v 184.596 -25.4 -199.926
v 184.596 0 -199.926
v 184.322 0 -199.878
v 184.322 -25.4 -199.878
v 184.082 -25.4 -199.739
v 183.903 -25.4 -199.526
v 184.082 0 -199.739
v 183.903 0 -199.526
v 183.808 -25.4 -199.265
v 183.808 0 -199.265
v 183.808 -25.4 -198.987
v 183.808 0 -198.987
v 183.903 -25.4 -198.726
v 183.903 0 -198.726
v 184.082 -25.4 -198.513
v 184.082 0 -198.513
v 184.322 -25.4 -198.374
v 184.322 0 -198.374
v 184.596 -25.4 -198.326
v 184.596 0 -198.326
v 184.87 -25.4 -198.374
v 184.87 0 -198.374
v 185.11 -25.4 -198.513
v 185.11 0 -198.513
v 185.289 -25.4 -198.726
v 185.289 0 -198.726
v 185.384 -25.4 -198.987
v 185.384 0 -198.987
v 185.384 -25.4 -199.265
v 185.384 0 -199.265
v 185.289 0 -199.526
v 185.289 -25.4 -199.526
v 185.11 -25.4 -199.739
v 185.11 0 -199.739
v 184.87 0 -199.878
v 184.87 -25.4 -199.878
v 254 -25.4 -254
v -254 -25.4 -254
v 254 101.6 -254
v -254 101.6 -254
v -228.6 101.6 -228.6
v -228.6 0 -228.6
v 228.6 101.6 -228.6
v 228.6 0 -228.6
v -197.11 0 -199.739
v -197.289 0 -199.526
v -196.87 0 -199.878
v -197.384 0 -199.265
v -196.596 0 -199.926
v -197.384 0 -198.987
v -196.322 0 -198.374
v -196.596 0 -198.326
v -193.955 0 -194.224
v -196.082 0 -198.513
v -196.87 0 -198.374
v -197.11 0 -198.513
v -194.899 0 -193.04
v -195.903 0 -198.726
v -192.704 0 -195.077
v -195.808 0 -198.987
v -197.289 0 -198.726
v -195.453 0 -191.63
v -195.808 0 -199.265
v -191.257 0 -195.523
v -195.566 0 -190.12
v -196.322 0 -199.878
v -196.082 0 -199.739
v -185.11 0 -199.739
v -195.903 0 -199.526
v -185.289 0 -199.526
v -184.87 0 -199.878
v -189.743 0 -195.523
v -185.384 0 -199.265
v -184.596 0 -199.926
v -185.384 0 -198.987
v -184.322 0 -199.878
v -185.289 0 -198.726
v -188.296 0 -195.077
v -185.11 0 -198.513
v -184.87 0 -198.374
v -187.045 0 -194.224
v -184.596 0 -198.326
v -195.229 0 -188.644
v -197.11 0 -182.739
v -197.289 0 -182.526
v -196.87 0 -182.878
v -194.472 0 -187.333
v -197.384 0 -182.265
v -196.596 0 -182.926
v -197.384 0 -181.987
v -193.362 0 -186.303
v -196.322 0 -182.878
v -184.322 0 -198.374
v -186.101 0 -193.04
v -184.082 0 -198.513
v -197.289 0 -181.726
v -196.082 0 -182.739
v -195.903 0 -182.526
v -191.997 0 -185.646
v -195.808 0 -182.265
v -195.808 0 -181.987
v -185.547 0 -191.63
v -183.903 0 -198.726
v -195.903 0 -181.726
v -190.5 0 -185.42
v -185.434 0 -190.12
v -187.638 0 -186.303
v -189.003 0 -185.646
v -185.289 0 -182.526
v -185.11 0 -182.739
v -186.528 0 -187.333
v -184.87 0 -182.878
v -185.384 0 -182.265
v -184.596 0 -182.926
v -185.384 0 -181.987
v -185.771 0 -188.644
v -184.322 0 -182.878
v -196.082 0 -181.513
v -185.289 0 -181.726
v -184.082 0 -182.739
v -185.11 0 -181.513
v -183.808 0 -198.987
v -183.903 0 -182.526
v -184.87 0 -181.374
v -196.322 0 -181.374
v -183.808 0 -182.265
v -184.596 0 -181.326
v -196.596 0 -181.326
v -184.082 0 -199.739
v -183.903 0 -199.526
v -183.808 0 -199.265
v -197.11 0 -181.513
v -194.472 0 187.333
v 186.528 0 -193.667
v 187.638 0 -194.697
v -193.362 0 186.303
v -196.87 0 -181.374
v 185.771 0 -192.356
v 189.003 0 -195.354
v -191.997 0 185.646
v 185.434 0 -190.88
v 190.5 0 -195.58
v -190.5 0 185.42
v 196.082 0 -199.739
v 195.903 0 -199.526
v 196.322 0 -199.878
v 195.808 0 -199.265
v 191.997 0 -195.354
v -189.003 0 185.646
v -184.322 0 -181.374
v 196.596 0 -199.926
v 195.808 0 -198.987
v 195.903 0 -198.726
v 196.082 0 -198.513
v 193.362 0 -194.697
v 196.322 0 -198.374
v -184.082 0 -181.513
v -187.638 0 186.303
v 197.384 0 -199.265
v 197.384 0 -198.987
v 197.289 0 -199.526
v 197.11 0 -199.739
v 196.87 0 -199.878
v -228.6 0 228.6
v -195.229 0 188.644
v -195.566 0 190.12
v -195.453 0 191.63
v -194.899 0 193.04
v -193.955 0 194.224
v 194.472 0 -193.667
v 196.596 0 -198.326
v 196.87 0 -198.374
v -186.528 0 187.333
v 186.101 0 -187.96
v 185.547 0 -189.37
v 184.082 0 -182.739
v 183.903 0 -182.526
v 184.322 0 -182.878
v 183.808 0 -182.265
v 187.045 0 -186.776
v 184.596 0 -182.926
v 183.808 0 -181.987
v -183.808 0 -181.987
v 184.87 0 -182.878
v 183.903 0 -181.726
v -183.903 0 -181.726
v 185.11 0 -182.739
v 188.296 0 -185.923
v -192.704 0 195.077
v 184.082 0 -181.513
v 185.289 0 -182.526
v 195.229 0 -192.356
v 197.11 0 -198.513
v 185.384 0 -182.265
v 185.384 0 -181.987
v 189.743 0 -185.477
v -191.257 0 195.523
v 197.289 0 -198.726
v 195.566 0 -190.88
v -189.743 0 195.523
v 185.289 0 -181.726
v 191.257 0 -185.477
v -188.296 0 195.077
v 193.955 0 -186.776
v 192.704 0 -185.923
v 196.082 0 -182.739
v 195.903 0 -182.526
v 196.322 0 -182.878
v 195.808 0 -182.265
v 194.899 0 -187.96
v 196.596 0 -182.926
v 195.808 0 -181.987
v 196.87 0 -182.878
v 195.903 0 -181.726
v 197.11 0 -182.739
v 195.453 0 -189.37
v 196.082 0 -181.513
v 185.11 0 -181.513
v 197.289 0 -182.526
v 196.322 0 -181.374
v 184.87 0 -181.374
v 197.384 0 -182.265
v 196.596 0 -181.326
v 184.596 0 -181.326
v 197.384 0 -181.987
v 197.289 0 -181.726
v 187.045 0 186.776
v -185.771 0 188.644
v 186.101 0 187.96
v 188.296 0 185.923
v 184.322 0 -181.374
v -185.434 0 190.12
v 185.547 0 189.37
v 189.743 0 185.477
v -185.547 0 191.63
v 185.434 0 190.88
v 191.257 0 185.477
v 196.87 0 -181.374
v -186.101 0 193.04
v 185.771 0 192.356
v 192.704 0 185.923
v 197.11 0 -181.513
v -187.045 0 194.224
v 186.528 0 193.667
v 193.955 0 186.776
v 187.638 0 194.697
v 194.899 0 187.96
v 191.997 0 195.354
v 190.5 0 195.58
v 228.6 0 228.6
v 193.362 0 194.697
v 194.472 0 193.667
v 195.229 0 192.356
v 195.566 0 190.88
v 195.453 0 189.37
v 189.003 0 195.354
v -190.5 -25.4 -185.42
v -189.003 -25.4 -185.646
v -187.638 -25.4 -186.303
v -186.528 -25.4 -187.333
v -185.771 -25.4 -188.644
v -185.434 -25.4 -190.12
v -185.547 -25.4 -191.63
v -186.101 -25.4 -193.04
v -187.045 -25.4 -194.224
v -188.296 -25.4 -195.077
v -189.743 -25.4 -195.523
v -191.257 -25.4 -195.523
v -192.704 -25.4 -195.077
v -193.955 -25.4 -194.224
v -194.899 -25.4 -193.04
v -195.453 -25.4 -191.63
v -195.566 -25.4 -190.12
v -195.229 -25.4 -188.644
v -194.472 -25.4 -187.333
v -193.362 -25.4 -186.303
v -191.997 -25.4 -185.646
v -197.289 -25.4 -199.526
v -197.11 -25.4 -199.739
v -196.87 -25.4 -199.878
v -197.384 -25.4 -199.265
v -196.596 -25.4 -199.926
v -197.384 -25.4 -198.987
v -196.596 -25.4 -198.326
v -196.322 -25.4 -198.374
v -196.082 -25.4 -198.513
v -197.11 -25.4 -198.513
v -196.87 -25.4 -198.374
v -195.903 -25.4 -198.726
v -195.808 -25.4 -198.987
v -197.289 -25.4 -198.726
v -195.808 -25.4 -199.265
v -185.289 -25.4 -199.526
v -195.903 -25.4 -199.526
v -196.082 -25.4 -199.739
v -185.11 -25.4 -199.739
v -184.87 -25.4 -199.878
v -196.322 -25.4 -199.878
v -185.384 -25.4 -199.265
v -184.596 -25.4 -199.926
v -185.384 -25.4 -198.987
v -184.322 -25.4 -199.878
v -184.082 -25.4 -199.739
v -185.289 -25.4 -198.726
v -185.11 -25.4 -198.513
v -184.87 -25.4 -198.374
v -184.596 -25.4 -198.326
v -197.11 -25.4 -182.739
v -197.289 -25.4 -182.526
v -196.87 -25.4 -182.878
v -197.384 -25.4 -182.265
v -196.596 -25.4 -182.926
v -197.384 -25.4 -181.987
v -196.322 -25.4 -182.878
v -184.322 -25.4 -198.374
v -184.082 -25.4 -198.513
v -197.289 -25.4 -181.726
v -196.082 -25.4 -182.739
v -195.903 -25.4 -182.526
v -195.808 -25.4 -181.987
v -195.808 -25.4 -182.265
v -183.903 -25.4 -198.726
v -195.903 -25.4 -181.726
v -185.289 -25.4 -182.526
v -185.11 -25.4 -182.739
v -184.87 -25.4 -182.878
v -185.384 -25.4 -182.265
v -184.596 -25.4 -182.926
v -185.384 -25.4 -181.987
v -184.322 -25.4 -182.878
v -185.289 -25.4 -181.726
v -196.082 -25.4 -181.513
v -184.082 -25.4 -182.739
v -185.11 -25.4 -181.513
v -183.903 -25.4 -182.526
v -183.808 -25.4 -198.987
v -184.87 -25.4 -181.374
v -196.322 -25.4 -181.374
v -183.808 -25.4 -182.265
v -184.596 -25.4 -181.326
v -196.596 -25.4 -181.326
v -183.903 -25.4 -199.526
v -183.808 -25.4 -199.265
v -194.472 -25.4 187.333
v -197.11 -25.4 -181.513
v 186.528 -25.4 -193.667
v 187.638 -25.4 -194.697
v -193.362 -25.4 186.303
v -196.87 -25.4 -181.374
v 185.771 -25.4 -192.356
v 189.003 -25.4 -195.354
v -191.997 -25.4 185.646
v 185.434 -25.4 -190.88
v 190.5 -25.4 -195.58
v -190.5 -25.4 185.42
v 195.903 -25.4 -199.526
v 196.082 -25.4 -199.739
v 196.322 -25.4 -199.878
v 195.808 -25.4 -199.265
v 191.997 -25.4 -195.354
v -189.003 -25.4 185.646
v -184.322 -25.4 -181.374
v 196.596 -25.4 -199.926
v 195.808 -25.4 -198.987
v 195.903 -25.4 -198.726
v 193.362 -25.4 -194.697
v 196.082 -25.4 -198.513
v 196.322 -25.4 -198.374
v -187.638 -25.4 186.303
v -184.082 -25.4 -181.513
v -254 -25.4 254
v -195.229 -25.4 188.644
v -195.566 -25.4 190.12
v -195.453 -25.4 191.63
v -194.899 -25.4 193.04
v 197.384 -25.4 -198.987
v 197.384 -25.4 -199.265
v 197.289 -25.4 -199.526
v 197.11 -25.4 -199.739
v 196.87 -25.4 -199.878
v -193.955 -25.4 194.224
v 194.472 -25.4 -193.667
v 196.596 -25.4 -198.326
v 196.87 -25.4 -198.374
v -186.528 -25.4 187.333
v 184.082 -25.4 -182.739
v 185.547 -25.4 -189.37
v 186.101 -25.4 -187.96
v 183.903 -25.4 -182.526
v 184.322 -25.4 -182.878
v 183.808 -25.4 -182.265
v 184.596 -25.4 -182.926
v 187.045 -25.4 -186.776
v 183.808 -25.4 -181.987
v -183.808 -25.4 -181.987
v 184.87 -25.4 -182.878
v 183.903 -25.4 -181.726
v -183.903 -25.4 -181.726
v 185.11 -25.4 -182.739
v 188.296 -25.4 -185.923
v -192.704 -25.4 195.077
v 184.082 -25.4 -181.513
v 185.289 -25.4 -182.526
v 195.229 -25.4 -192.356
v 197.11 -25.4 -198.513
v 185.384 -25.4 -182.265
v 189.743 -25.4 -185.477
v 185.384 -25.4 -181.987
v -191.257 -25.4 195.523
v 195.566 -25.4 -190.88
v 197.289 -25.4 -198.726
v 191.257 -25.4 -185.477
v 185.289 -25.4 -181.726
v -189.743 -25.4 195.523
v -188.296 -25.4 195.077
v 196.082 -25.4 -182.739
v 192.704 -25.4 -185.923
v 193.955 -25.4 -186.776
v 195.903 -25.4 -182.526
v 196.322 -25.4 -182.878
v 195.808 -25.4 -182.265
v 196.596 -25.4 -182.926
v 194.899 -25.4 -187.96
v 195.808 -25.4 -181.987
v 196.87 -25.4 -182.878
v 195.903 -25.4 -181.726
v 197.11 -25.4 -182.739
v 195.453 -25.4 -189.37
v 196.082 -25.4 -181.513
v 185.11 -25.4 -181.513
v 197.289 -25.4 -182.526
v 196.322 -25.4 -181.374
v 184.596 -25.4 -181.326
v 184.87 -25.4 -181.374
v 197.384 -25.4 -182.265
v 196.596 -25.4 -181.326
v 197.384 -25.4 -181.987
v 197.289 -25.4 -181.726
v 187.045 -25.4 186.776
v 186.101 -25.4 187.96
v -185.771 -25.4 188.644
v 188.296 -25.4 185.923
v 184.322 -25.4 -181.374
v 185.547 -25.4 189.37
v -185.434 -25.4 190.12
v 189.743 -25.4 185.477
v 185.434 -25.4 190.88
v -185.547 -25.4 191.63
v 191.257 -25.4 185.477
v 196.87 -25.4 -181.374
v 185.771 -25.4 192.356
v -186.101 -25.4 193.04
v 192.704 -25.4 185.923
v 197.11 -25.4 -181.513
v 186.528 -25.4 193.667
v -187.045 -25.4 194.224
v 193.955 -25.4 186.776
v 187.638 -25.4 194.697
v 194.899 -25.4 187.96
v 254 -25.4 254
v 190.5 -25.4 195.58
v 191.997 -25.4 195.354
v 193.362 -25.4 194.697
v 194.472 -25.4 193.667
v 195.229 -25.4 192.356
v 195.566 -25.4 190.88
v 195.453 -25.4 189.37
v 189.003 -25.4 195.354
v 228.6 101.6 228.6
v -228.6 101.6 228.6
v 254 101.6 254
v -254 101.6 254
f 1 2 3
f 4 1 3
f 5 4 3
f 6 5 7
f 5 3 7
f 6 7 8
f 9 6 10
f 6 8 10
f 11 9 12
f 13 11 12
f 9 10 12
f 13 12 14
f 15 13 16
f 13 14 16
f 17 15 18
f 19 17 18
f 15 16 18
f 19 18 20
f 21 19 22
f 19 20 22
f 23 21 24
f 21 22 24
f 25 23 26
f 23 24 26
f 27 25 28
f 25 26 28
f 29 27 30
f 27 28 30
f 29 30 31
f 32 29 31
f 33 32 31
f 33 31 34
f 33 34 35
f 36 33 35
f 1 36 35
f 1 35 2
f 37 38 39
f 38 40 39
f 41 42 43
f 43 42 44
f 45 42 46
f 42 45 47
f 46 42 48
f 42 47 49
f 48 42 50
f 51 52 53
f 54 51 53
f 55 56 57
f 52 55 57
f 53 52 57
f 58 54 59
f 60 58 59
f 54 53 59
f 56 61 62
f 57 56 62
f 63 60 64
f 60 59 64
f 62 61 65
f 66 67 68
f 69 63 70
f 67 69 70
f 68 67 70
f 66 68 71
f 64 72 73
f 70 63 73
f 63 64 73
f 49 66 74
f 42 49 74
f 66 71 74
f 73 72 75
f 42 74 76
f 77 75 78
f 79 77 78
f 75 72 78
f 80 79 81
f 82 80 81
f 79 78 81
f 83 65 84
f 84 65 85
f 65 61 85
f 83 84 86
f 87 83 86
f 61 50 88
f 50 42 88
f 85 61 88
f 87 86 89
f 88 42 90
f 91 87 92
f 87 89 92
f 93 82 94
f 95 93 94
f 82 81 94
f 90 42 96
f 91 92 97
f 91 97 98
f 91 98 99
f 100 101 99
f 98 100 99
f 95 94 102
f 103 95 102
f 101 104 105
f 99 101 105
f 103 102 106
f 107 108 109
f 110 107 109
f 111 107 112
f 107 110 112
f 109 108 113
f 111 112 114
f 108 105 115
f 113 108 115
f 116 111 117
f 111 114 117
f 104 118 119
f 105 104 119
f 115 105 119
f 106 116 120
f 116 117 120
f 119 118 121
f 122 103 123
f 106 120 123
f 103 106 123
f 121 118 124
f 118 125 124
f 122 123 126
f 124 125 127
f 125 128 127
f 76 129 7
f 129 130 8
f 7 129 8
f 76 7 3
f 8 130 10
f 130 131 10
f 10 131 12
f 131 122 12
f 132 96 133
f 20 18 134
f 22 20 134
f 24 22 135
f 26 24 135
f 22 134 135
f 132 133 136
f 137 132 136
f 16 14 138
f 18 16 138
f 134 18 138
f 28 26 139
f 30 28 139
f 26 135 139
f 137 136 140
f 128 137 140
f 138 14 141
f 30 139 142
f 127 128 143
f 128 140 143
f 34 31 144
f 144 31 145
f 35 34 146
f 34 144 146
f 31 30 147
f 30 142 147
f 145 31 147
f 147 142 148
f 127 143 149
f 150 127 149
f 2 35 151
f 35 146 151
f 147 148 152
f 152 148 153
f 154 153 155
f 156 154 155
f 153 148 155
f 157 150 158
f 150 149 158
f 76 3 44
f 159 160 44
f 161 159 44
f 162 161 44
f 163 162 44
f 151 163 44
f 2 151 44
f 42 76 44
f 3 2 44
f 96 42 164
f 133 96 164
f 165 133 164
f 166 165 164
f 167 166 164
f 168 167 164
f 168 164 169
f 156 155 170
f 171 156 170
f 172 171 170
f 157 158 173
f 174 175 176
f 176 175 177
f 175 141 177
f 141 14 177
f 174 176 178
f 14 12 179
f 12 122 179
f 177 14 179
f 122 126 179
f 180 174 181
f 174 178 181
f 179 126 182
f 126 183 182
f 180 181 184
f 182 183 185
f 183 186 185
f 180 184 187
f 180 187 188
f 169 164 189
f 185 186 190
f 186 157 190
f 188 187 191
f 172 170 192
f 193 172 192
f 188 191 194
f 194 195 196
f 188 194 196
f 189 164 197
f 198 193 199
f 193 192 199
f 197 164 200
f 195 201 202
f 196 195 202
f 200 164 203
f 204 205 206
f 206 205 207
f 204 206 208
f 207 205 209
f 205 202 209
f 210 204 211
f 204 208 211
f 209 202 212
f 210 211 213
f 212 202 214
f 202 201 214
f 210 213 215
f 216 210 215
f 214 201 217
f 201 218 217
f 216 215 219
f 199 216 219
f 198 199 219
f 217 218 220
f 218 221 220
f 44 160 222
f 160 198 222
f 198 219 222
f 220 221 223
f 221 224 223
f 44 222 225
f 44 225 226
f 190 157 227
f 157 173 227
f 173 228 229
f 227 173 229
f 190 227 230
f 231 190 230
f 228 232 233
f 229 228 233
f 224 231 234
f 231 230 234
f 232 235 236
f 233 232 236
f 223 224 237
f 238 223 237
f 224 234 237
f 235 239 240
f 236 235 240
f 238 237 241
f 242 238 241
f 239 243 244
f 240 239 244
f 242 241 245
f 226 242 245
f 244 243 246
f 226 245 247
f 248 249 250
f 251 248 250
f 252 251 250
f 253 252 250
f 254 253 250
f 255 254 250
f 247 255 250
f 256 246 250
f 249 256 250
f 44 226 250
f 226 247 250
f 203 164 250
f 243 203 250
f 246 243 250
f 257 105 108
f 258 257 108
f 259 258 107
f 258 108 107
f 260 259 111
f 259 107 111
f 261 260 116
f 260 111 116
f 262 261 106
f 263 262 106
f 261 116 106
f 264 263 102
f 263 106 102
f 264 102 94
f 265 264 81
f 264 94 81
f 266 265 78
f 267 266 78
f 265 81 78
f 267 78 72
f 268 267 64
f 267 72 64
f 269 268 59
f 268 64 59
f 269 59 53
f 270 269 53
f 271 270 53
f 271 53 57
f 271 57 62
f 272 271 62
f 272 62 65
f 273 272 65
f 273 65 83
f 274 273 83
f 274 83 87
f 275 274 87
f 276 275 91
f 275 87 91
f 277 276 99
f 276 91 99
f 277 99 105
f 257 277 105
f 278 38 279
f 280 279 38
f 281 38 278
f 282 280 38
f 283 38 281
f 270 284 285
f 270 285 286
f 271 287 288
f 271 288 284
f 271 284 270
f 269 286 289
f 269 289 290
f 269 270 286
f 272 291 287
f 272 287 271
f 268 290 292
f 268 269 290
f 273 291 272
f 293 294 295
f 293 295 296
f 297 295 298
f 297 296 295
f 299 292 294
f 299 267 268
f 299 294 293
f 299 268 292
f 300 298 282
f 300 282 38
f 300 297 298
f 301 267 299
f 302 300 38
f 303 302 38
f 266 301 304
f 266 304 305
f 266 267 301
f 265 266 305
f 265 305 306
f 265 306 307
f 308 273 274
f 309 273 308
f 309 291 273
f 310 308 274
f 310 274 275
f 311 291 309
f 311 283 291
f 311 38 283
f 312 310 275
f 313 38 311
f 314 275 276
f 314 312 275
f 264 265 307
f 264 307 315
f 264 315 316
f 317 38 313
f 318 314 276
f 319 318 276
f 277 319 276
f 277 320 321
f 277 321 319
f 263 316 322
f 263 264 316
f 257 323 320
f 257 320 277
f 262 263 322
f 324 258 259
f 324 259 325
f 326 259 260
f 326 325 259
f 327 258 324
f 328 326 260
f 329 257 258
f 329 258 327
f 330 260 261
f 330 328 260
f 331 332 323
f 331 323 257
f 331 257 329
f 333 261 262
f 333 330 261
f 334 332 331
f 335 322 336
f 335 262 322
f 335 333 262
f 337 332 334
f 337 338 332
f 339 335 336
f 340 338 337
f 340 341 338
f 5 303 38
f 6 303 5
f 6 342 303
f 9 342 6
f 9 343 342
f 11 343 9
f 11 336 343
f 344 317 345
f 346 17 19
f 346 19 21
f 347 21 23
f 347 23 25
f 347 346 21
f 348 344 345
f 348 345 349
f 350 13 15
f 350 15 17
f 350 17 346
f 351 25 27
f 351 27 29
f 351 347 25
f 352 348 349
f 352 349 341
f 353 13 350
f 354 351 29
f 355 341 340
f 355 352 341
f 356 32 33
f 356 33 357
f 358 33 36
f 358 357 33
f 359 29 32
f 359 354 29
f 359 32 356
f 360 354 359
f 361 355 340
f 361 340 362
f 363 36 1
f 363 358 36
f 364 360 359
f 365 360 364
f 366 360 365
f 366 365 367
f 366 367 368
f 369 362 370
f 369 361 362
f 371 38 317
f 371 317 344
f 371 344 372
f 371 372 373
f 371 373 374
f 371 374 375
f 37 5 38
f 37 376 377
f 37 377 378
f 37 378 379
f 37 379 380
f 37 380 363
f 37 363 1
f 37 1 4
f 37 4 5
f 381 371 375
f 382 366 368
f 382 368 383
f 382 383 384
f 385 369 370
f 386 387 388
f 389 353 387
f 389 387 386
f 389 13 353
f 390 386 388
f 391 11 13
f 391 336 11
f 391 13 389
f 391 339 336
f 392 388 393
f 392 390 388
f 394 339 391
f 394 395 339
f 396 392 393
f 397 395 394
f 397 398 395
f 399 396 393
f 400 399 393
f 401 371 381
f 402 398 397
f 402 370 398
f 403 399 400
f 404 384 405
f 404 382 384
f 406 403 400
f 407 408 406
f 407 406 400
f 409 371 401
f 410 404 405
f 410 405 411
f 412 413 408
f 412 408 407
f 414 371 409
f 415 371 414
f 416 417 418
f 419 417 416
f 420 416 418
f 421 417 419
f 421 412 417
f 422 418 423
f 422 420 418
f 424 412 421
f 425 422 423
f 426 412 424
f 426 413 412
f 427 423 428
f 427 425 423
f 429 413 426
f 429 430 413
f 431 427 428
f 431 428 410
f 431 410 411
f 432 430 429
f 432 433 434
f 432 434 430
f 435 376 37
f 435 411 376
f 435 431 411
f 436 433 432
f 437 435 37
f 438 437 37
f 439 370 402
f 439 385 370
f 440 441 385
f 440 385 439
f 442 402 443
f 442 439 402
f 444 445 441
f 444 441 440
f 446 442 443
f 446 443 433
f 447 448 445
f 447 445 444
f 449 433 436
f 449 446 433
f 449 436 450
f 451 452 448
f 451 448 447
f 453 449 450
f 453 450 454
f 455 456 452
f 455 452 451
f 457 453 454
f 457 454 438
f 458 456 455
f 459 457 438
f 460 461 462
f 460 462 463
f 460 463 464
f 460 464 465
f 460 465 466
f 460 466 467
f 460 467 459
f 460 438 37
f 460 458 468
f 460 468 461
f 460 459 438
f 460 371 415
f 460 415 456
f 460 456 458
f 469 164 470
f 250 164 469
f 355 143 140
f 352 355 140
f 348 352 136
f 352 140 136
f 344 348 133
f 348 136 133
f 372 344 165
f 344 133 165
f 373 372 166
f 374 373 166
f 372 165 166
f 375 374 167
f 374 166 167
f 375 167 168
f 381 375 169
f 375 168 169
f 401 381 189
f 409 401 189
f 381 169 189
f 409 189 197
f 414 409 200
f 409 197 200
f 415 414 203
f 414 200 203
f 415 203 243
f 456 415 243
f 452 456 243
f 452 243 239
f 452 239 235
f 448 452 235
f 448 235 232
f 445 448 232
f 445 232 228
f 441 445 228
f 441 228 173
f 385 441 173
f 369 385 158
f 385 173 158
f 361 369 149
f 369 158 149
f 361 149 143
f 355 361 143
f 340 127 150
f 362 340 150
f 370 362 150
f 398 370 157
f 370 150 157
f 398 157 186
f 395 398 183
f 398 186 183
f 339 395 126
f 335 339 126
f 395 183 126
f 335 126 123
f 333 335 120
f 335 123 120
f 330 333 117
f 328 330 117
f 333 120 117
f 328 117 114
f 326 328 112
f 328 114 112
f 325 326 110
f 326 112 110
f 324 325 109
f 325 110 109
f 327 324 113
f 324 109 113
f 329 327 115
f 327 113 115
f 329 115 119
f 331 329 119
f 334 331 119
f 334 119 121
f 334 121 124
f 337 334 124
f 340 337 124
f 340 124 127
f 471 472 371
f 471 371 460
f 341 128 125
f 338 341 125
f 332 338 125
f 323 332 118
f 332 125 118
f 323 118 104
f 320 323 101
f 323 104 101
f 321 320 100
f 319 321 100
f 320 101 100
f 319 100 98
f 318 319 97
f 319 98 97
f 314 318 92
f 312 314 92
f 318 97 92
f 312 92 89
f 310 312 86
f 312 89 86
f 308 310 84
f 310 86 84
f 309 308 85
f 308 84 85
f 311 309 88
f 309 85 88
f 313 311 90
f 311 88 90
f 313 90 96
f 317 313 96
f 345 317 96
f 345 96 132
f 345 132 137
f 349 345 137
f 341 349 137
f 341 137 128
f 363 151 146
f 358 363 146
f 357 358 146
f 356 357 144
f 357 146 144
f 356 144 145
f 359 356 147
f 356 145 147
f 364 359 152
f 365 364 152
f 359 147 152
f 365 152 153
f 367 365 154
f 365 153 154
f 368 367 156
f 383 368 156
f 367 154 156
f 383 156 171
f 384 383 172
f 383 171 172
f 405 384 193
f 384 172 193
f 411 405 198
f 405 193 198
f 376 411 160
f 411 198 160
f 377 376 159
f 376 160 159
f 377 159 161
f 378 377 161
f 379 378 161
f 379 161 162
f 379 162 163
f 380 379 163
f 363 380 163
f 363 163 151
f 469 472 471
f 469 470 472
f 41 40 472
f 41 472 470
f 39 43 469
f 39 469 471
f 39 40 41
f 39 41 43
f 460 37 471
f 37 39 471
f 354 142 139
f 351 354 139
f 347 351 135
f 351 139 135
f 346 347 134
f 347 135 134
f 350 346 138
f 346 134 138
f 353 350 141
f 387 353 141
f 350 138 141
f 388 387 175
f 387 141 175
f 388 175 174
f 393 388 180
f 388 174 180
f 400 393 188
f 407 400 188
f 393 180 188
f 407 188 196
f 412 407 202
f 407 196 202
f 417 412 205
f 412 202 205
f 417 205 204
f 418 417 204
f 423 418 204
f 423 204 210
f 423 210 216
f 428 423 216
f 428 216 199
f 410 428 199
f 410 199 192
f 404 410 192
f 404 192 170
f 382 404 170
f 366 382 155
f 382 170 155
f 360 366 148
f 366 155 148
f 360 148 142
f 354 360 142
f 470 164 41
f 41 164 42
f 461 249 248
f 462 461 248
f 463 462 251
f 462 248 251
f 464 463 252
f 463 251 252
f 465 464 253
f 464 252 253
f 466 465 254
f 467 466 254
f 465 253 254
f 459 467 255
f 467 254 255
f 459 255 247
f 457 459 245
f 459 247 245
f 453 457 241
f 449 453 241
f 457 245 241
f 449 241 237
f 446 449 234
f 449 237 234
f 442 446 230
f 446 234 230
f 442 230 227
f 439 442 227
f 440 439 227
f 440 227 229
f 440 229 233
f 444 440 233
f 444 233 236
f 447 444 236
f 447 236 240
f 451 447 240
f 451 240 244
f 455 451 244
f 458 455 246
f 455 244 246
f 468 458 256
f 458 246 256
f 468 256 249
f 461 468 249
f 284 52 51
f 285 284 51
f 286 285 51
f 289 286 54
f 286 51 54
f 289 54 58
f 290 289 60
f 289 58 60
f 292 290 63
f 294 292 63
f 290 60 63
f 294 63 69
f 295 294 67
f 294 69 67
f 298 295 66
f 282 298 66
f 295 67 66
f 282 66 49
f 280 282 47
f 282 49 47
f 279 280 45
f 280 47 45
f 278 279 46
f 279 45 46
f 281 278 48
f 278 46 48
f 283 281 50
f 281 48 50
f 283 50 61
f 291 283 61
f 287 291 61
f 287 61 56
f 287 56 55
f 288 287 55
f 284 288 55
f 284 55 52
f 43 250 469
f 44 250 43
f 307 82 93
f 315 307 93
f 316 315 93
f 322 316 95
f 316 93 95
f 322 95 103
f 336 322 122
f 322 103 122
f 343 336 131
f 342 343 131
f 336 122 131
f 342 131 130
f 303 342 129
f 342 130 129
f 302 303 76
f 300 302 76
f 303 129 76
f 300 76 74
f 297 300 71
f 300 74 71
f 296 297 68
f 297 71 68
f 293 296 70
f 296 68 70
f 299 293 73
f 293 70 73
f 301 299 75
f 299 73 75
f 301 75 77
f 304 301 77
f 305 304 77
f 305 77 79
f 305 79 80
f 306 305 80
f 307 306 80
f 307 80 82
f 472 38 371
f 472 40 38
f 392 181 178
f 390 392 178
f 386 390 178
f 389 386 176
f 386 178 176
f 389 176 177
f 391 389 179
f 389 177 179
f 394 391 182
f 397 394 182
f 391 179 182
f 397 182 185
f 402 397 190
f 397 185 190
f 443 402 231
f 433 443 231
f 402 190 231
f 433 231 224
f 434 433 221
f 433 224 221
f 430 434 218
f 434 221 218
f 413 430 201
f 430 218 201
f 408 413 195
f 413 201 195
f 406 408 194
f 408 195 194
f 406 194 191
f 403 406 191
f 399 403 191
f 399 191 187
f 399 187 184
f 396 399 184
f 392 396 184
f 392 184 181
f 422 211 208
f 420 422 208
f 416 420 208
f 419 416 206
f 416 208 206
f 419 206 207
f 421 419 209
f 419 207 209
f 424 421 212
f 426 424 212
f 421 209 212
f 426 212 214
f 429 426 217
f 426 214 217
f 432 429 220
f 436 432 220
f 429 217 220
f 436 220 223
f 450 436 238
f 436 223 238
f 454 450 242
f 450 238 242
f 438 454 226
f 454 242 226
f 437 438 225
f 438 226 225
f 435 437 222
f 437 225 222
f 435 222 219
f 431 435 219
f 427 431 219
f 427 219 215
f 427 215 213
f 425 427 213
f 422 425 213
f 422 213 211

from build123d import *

# Parameters (mm, degrees)
SKETCH1_W           = 508
SKETCH1_H           = 508
SKETCH1_W_2         = 457.2
SKETCH1_H_2         = 457.2
BOSS_EXTRUDE1_DEPTH = 101.6
SKETCH2_W           = 508
SKETCH2_H           = 508
BOSS_EXTRUDE2_DEPTH = 25.4
SKETCH3_R           = 0.8
SKETCH3_R_2         = 5.08
CUT_EXTRUDE1_DEPTH  = 25.4


with BuildPart() as part:
    # Sketch1 → Boss-Extrude1 (new body)
    with BuildSketch(Plane(origin=(0, 0, 0), x_dir=(1, 0, 0), z_dir=(0, 1, 0))):
        Rectangle(SKETCH1_W, SKETCH1_H)
        Rectangle(SKETCH1_W_2, SKETCH1_H_2, mode=Mode.SUBTRACT)
    extrude(amount=BOSS_EXTRUDE1_DEPTH)

    # Sketch2 → Boss-Extrude2 (add)
    with BuildSketch(Plane.XZ):
        Rectangle(SKETCH2_W, SKETCH2_H)
    extrude(amount=BOSS_EXTRUDE2_DEPTH)

    # Sketch3 → Cut-Extrude1 (cut)
    with BuildSketch(Plane(origin=(0, 0, 0), x_dir=(1, 0, 0), z_dir=(0, 1, 0))):
        with Locations(Location((-196.596, 199.126, 0), (0, 0, 270))):
            Circle(SKETCH3_R)
        with Locations(Location((-184.596, 199.126, 0), (0, 0, 270))):
            Circle(SKETCH3_R)
        with Locations(Location((-190.5, 190.5, 0), (0, 0, 270))):
            Circle(SKETCH3_R_2)
        with Locations(Location((-184.596, 182.126, 0), (0, 0, 270))):
            Circle(SKETCH3_R)
        with Locations(Location((-196.596, 182.126, 0), (0, 0, 270))):
            Circle(SKETCH3_R)
        with Locations(Location((190.5, 190.5, 0), (0, 0, 90))):
            Circle(SKETCH3_R_2)
        with Locations(Location((184.596, 199.126, 0), (0, 0, 90))):
            Circle(SKETCH3_R)
        with Locations(Location((184.596, 182.126, 0), (0, 0, 90))):
            Circle(SKETCH3_R)
        with Locations(Location((196.596, 182.126, 0), (0, 0, 90))):
            Circle(SKETCH3_R)
        with Locations(Location((196.596, 199.126, 0), (0, 0, 90))):
            Circle(SKETCH3_R)
        with Locations(Location((190.5, -190.5, 0), (0, 0, 270))):
            Circle(SKETCH3_R_2)
        with Locations(Location((-190.5, -190.5, 0), (0, 0, 90))):
            Circle(SKETCH3_R_2)
    extrude(amount=-CUT_EXTRUDE1_DEPTH, mode=Mode.SUBTRACT)


solid = part.part
